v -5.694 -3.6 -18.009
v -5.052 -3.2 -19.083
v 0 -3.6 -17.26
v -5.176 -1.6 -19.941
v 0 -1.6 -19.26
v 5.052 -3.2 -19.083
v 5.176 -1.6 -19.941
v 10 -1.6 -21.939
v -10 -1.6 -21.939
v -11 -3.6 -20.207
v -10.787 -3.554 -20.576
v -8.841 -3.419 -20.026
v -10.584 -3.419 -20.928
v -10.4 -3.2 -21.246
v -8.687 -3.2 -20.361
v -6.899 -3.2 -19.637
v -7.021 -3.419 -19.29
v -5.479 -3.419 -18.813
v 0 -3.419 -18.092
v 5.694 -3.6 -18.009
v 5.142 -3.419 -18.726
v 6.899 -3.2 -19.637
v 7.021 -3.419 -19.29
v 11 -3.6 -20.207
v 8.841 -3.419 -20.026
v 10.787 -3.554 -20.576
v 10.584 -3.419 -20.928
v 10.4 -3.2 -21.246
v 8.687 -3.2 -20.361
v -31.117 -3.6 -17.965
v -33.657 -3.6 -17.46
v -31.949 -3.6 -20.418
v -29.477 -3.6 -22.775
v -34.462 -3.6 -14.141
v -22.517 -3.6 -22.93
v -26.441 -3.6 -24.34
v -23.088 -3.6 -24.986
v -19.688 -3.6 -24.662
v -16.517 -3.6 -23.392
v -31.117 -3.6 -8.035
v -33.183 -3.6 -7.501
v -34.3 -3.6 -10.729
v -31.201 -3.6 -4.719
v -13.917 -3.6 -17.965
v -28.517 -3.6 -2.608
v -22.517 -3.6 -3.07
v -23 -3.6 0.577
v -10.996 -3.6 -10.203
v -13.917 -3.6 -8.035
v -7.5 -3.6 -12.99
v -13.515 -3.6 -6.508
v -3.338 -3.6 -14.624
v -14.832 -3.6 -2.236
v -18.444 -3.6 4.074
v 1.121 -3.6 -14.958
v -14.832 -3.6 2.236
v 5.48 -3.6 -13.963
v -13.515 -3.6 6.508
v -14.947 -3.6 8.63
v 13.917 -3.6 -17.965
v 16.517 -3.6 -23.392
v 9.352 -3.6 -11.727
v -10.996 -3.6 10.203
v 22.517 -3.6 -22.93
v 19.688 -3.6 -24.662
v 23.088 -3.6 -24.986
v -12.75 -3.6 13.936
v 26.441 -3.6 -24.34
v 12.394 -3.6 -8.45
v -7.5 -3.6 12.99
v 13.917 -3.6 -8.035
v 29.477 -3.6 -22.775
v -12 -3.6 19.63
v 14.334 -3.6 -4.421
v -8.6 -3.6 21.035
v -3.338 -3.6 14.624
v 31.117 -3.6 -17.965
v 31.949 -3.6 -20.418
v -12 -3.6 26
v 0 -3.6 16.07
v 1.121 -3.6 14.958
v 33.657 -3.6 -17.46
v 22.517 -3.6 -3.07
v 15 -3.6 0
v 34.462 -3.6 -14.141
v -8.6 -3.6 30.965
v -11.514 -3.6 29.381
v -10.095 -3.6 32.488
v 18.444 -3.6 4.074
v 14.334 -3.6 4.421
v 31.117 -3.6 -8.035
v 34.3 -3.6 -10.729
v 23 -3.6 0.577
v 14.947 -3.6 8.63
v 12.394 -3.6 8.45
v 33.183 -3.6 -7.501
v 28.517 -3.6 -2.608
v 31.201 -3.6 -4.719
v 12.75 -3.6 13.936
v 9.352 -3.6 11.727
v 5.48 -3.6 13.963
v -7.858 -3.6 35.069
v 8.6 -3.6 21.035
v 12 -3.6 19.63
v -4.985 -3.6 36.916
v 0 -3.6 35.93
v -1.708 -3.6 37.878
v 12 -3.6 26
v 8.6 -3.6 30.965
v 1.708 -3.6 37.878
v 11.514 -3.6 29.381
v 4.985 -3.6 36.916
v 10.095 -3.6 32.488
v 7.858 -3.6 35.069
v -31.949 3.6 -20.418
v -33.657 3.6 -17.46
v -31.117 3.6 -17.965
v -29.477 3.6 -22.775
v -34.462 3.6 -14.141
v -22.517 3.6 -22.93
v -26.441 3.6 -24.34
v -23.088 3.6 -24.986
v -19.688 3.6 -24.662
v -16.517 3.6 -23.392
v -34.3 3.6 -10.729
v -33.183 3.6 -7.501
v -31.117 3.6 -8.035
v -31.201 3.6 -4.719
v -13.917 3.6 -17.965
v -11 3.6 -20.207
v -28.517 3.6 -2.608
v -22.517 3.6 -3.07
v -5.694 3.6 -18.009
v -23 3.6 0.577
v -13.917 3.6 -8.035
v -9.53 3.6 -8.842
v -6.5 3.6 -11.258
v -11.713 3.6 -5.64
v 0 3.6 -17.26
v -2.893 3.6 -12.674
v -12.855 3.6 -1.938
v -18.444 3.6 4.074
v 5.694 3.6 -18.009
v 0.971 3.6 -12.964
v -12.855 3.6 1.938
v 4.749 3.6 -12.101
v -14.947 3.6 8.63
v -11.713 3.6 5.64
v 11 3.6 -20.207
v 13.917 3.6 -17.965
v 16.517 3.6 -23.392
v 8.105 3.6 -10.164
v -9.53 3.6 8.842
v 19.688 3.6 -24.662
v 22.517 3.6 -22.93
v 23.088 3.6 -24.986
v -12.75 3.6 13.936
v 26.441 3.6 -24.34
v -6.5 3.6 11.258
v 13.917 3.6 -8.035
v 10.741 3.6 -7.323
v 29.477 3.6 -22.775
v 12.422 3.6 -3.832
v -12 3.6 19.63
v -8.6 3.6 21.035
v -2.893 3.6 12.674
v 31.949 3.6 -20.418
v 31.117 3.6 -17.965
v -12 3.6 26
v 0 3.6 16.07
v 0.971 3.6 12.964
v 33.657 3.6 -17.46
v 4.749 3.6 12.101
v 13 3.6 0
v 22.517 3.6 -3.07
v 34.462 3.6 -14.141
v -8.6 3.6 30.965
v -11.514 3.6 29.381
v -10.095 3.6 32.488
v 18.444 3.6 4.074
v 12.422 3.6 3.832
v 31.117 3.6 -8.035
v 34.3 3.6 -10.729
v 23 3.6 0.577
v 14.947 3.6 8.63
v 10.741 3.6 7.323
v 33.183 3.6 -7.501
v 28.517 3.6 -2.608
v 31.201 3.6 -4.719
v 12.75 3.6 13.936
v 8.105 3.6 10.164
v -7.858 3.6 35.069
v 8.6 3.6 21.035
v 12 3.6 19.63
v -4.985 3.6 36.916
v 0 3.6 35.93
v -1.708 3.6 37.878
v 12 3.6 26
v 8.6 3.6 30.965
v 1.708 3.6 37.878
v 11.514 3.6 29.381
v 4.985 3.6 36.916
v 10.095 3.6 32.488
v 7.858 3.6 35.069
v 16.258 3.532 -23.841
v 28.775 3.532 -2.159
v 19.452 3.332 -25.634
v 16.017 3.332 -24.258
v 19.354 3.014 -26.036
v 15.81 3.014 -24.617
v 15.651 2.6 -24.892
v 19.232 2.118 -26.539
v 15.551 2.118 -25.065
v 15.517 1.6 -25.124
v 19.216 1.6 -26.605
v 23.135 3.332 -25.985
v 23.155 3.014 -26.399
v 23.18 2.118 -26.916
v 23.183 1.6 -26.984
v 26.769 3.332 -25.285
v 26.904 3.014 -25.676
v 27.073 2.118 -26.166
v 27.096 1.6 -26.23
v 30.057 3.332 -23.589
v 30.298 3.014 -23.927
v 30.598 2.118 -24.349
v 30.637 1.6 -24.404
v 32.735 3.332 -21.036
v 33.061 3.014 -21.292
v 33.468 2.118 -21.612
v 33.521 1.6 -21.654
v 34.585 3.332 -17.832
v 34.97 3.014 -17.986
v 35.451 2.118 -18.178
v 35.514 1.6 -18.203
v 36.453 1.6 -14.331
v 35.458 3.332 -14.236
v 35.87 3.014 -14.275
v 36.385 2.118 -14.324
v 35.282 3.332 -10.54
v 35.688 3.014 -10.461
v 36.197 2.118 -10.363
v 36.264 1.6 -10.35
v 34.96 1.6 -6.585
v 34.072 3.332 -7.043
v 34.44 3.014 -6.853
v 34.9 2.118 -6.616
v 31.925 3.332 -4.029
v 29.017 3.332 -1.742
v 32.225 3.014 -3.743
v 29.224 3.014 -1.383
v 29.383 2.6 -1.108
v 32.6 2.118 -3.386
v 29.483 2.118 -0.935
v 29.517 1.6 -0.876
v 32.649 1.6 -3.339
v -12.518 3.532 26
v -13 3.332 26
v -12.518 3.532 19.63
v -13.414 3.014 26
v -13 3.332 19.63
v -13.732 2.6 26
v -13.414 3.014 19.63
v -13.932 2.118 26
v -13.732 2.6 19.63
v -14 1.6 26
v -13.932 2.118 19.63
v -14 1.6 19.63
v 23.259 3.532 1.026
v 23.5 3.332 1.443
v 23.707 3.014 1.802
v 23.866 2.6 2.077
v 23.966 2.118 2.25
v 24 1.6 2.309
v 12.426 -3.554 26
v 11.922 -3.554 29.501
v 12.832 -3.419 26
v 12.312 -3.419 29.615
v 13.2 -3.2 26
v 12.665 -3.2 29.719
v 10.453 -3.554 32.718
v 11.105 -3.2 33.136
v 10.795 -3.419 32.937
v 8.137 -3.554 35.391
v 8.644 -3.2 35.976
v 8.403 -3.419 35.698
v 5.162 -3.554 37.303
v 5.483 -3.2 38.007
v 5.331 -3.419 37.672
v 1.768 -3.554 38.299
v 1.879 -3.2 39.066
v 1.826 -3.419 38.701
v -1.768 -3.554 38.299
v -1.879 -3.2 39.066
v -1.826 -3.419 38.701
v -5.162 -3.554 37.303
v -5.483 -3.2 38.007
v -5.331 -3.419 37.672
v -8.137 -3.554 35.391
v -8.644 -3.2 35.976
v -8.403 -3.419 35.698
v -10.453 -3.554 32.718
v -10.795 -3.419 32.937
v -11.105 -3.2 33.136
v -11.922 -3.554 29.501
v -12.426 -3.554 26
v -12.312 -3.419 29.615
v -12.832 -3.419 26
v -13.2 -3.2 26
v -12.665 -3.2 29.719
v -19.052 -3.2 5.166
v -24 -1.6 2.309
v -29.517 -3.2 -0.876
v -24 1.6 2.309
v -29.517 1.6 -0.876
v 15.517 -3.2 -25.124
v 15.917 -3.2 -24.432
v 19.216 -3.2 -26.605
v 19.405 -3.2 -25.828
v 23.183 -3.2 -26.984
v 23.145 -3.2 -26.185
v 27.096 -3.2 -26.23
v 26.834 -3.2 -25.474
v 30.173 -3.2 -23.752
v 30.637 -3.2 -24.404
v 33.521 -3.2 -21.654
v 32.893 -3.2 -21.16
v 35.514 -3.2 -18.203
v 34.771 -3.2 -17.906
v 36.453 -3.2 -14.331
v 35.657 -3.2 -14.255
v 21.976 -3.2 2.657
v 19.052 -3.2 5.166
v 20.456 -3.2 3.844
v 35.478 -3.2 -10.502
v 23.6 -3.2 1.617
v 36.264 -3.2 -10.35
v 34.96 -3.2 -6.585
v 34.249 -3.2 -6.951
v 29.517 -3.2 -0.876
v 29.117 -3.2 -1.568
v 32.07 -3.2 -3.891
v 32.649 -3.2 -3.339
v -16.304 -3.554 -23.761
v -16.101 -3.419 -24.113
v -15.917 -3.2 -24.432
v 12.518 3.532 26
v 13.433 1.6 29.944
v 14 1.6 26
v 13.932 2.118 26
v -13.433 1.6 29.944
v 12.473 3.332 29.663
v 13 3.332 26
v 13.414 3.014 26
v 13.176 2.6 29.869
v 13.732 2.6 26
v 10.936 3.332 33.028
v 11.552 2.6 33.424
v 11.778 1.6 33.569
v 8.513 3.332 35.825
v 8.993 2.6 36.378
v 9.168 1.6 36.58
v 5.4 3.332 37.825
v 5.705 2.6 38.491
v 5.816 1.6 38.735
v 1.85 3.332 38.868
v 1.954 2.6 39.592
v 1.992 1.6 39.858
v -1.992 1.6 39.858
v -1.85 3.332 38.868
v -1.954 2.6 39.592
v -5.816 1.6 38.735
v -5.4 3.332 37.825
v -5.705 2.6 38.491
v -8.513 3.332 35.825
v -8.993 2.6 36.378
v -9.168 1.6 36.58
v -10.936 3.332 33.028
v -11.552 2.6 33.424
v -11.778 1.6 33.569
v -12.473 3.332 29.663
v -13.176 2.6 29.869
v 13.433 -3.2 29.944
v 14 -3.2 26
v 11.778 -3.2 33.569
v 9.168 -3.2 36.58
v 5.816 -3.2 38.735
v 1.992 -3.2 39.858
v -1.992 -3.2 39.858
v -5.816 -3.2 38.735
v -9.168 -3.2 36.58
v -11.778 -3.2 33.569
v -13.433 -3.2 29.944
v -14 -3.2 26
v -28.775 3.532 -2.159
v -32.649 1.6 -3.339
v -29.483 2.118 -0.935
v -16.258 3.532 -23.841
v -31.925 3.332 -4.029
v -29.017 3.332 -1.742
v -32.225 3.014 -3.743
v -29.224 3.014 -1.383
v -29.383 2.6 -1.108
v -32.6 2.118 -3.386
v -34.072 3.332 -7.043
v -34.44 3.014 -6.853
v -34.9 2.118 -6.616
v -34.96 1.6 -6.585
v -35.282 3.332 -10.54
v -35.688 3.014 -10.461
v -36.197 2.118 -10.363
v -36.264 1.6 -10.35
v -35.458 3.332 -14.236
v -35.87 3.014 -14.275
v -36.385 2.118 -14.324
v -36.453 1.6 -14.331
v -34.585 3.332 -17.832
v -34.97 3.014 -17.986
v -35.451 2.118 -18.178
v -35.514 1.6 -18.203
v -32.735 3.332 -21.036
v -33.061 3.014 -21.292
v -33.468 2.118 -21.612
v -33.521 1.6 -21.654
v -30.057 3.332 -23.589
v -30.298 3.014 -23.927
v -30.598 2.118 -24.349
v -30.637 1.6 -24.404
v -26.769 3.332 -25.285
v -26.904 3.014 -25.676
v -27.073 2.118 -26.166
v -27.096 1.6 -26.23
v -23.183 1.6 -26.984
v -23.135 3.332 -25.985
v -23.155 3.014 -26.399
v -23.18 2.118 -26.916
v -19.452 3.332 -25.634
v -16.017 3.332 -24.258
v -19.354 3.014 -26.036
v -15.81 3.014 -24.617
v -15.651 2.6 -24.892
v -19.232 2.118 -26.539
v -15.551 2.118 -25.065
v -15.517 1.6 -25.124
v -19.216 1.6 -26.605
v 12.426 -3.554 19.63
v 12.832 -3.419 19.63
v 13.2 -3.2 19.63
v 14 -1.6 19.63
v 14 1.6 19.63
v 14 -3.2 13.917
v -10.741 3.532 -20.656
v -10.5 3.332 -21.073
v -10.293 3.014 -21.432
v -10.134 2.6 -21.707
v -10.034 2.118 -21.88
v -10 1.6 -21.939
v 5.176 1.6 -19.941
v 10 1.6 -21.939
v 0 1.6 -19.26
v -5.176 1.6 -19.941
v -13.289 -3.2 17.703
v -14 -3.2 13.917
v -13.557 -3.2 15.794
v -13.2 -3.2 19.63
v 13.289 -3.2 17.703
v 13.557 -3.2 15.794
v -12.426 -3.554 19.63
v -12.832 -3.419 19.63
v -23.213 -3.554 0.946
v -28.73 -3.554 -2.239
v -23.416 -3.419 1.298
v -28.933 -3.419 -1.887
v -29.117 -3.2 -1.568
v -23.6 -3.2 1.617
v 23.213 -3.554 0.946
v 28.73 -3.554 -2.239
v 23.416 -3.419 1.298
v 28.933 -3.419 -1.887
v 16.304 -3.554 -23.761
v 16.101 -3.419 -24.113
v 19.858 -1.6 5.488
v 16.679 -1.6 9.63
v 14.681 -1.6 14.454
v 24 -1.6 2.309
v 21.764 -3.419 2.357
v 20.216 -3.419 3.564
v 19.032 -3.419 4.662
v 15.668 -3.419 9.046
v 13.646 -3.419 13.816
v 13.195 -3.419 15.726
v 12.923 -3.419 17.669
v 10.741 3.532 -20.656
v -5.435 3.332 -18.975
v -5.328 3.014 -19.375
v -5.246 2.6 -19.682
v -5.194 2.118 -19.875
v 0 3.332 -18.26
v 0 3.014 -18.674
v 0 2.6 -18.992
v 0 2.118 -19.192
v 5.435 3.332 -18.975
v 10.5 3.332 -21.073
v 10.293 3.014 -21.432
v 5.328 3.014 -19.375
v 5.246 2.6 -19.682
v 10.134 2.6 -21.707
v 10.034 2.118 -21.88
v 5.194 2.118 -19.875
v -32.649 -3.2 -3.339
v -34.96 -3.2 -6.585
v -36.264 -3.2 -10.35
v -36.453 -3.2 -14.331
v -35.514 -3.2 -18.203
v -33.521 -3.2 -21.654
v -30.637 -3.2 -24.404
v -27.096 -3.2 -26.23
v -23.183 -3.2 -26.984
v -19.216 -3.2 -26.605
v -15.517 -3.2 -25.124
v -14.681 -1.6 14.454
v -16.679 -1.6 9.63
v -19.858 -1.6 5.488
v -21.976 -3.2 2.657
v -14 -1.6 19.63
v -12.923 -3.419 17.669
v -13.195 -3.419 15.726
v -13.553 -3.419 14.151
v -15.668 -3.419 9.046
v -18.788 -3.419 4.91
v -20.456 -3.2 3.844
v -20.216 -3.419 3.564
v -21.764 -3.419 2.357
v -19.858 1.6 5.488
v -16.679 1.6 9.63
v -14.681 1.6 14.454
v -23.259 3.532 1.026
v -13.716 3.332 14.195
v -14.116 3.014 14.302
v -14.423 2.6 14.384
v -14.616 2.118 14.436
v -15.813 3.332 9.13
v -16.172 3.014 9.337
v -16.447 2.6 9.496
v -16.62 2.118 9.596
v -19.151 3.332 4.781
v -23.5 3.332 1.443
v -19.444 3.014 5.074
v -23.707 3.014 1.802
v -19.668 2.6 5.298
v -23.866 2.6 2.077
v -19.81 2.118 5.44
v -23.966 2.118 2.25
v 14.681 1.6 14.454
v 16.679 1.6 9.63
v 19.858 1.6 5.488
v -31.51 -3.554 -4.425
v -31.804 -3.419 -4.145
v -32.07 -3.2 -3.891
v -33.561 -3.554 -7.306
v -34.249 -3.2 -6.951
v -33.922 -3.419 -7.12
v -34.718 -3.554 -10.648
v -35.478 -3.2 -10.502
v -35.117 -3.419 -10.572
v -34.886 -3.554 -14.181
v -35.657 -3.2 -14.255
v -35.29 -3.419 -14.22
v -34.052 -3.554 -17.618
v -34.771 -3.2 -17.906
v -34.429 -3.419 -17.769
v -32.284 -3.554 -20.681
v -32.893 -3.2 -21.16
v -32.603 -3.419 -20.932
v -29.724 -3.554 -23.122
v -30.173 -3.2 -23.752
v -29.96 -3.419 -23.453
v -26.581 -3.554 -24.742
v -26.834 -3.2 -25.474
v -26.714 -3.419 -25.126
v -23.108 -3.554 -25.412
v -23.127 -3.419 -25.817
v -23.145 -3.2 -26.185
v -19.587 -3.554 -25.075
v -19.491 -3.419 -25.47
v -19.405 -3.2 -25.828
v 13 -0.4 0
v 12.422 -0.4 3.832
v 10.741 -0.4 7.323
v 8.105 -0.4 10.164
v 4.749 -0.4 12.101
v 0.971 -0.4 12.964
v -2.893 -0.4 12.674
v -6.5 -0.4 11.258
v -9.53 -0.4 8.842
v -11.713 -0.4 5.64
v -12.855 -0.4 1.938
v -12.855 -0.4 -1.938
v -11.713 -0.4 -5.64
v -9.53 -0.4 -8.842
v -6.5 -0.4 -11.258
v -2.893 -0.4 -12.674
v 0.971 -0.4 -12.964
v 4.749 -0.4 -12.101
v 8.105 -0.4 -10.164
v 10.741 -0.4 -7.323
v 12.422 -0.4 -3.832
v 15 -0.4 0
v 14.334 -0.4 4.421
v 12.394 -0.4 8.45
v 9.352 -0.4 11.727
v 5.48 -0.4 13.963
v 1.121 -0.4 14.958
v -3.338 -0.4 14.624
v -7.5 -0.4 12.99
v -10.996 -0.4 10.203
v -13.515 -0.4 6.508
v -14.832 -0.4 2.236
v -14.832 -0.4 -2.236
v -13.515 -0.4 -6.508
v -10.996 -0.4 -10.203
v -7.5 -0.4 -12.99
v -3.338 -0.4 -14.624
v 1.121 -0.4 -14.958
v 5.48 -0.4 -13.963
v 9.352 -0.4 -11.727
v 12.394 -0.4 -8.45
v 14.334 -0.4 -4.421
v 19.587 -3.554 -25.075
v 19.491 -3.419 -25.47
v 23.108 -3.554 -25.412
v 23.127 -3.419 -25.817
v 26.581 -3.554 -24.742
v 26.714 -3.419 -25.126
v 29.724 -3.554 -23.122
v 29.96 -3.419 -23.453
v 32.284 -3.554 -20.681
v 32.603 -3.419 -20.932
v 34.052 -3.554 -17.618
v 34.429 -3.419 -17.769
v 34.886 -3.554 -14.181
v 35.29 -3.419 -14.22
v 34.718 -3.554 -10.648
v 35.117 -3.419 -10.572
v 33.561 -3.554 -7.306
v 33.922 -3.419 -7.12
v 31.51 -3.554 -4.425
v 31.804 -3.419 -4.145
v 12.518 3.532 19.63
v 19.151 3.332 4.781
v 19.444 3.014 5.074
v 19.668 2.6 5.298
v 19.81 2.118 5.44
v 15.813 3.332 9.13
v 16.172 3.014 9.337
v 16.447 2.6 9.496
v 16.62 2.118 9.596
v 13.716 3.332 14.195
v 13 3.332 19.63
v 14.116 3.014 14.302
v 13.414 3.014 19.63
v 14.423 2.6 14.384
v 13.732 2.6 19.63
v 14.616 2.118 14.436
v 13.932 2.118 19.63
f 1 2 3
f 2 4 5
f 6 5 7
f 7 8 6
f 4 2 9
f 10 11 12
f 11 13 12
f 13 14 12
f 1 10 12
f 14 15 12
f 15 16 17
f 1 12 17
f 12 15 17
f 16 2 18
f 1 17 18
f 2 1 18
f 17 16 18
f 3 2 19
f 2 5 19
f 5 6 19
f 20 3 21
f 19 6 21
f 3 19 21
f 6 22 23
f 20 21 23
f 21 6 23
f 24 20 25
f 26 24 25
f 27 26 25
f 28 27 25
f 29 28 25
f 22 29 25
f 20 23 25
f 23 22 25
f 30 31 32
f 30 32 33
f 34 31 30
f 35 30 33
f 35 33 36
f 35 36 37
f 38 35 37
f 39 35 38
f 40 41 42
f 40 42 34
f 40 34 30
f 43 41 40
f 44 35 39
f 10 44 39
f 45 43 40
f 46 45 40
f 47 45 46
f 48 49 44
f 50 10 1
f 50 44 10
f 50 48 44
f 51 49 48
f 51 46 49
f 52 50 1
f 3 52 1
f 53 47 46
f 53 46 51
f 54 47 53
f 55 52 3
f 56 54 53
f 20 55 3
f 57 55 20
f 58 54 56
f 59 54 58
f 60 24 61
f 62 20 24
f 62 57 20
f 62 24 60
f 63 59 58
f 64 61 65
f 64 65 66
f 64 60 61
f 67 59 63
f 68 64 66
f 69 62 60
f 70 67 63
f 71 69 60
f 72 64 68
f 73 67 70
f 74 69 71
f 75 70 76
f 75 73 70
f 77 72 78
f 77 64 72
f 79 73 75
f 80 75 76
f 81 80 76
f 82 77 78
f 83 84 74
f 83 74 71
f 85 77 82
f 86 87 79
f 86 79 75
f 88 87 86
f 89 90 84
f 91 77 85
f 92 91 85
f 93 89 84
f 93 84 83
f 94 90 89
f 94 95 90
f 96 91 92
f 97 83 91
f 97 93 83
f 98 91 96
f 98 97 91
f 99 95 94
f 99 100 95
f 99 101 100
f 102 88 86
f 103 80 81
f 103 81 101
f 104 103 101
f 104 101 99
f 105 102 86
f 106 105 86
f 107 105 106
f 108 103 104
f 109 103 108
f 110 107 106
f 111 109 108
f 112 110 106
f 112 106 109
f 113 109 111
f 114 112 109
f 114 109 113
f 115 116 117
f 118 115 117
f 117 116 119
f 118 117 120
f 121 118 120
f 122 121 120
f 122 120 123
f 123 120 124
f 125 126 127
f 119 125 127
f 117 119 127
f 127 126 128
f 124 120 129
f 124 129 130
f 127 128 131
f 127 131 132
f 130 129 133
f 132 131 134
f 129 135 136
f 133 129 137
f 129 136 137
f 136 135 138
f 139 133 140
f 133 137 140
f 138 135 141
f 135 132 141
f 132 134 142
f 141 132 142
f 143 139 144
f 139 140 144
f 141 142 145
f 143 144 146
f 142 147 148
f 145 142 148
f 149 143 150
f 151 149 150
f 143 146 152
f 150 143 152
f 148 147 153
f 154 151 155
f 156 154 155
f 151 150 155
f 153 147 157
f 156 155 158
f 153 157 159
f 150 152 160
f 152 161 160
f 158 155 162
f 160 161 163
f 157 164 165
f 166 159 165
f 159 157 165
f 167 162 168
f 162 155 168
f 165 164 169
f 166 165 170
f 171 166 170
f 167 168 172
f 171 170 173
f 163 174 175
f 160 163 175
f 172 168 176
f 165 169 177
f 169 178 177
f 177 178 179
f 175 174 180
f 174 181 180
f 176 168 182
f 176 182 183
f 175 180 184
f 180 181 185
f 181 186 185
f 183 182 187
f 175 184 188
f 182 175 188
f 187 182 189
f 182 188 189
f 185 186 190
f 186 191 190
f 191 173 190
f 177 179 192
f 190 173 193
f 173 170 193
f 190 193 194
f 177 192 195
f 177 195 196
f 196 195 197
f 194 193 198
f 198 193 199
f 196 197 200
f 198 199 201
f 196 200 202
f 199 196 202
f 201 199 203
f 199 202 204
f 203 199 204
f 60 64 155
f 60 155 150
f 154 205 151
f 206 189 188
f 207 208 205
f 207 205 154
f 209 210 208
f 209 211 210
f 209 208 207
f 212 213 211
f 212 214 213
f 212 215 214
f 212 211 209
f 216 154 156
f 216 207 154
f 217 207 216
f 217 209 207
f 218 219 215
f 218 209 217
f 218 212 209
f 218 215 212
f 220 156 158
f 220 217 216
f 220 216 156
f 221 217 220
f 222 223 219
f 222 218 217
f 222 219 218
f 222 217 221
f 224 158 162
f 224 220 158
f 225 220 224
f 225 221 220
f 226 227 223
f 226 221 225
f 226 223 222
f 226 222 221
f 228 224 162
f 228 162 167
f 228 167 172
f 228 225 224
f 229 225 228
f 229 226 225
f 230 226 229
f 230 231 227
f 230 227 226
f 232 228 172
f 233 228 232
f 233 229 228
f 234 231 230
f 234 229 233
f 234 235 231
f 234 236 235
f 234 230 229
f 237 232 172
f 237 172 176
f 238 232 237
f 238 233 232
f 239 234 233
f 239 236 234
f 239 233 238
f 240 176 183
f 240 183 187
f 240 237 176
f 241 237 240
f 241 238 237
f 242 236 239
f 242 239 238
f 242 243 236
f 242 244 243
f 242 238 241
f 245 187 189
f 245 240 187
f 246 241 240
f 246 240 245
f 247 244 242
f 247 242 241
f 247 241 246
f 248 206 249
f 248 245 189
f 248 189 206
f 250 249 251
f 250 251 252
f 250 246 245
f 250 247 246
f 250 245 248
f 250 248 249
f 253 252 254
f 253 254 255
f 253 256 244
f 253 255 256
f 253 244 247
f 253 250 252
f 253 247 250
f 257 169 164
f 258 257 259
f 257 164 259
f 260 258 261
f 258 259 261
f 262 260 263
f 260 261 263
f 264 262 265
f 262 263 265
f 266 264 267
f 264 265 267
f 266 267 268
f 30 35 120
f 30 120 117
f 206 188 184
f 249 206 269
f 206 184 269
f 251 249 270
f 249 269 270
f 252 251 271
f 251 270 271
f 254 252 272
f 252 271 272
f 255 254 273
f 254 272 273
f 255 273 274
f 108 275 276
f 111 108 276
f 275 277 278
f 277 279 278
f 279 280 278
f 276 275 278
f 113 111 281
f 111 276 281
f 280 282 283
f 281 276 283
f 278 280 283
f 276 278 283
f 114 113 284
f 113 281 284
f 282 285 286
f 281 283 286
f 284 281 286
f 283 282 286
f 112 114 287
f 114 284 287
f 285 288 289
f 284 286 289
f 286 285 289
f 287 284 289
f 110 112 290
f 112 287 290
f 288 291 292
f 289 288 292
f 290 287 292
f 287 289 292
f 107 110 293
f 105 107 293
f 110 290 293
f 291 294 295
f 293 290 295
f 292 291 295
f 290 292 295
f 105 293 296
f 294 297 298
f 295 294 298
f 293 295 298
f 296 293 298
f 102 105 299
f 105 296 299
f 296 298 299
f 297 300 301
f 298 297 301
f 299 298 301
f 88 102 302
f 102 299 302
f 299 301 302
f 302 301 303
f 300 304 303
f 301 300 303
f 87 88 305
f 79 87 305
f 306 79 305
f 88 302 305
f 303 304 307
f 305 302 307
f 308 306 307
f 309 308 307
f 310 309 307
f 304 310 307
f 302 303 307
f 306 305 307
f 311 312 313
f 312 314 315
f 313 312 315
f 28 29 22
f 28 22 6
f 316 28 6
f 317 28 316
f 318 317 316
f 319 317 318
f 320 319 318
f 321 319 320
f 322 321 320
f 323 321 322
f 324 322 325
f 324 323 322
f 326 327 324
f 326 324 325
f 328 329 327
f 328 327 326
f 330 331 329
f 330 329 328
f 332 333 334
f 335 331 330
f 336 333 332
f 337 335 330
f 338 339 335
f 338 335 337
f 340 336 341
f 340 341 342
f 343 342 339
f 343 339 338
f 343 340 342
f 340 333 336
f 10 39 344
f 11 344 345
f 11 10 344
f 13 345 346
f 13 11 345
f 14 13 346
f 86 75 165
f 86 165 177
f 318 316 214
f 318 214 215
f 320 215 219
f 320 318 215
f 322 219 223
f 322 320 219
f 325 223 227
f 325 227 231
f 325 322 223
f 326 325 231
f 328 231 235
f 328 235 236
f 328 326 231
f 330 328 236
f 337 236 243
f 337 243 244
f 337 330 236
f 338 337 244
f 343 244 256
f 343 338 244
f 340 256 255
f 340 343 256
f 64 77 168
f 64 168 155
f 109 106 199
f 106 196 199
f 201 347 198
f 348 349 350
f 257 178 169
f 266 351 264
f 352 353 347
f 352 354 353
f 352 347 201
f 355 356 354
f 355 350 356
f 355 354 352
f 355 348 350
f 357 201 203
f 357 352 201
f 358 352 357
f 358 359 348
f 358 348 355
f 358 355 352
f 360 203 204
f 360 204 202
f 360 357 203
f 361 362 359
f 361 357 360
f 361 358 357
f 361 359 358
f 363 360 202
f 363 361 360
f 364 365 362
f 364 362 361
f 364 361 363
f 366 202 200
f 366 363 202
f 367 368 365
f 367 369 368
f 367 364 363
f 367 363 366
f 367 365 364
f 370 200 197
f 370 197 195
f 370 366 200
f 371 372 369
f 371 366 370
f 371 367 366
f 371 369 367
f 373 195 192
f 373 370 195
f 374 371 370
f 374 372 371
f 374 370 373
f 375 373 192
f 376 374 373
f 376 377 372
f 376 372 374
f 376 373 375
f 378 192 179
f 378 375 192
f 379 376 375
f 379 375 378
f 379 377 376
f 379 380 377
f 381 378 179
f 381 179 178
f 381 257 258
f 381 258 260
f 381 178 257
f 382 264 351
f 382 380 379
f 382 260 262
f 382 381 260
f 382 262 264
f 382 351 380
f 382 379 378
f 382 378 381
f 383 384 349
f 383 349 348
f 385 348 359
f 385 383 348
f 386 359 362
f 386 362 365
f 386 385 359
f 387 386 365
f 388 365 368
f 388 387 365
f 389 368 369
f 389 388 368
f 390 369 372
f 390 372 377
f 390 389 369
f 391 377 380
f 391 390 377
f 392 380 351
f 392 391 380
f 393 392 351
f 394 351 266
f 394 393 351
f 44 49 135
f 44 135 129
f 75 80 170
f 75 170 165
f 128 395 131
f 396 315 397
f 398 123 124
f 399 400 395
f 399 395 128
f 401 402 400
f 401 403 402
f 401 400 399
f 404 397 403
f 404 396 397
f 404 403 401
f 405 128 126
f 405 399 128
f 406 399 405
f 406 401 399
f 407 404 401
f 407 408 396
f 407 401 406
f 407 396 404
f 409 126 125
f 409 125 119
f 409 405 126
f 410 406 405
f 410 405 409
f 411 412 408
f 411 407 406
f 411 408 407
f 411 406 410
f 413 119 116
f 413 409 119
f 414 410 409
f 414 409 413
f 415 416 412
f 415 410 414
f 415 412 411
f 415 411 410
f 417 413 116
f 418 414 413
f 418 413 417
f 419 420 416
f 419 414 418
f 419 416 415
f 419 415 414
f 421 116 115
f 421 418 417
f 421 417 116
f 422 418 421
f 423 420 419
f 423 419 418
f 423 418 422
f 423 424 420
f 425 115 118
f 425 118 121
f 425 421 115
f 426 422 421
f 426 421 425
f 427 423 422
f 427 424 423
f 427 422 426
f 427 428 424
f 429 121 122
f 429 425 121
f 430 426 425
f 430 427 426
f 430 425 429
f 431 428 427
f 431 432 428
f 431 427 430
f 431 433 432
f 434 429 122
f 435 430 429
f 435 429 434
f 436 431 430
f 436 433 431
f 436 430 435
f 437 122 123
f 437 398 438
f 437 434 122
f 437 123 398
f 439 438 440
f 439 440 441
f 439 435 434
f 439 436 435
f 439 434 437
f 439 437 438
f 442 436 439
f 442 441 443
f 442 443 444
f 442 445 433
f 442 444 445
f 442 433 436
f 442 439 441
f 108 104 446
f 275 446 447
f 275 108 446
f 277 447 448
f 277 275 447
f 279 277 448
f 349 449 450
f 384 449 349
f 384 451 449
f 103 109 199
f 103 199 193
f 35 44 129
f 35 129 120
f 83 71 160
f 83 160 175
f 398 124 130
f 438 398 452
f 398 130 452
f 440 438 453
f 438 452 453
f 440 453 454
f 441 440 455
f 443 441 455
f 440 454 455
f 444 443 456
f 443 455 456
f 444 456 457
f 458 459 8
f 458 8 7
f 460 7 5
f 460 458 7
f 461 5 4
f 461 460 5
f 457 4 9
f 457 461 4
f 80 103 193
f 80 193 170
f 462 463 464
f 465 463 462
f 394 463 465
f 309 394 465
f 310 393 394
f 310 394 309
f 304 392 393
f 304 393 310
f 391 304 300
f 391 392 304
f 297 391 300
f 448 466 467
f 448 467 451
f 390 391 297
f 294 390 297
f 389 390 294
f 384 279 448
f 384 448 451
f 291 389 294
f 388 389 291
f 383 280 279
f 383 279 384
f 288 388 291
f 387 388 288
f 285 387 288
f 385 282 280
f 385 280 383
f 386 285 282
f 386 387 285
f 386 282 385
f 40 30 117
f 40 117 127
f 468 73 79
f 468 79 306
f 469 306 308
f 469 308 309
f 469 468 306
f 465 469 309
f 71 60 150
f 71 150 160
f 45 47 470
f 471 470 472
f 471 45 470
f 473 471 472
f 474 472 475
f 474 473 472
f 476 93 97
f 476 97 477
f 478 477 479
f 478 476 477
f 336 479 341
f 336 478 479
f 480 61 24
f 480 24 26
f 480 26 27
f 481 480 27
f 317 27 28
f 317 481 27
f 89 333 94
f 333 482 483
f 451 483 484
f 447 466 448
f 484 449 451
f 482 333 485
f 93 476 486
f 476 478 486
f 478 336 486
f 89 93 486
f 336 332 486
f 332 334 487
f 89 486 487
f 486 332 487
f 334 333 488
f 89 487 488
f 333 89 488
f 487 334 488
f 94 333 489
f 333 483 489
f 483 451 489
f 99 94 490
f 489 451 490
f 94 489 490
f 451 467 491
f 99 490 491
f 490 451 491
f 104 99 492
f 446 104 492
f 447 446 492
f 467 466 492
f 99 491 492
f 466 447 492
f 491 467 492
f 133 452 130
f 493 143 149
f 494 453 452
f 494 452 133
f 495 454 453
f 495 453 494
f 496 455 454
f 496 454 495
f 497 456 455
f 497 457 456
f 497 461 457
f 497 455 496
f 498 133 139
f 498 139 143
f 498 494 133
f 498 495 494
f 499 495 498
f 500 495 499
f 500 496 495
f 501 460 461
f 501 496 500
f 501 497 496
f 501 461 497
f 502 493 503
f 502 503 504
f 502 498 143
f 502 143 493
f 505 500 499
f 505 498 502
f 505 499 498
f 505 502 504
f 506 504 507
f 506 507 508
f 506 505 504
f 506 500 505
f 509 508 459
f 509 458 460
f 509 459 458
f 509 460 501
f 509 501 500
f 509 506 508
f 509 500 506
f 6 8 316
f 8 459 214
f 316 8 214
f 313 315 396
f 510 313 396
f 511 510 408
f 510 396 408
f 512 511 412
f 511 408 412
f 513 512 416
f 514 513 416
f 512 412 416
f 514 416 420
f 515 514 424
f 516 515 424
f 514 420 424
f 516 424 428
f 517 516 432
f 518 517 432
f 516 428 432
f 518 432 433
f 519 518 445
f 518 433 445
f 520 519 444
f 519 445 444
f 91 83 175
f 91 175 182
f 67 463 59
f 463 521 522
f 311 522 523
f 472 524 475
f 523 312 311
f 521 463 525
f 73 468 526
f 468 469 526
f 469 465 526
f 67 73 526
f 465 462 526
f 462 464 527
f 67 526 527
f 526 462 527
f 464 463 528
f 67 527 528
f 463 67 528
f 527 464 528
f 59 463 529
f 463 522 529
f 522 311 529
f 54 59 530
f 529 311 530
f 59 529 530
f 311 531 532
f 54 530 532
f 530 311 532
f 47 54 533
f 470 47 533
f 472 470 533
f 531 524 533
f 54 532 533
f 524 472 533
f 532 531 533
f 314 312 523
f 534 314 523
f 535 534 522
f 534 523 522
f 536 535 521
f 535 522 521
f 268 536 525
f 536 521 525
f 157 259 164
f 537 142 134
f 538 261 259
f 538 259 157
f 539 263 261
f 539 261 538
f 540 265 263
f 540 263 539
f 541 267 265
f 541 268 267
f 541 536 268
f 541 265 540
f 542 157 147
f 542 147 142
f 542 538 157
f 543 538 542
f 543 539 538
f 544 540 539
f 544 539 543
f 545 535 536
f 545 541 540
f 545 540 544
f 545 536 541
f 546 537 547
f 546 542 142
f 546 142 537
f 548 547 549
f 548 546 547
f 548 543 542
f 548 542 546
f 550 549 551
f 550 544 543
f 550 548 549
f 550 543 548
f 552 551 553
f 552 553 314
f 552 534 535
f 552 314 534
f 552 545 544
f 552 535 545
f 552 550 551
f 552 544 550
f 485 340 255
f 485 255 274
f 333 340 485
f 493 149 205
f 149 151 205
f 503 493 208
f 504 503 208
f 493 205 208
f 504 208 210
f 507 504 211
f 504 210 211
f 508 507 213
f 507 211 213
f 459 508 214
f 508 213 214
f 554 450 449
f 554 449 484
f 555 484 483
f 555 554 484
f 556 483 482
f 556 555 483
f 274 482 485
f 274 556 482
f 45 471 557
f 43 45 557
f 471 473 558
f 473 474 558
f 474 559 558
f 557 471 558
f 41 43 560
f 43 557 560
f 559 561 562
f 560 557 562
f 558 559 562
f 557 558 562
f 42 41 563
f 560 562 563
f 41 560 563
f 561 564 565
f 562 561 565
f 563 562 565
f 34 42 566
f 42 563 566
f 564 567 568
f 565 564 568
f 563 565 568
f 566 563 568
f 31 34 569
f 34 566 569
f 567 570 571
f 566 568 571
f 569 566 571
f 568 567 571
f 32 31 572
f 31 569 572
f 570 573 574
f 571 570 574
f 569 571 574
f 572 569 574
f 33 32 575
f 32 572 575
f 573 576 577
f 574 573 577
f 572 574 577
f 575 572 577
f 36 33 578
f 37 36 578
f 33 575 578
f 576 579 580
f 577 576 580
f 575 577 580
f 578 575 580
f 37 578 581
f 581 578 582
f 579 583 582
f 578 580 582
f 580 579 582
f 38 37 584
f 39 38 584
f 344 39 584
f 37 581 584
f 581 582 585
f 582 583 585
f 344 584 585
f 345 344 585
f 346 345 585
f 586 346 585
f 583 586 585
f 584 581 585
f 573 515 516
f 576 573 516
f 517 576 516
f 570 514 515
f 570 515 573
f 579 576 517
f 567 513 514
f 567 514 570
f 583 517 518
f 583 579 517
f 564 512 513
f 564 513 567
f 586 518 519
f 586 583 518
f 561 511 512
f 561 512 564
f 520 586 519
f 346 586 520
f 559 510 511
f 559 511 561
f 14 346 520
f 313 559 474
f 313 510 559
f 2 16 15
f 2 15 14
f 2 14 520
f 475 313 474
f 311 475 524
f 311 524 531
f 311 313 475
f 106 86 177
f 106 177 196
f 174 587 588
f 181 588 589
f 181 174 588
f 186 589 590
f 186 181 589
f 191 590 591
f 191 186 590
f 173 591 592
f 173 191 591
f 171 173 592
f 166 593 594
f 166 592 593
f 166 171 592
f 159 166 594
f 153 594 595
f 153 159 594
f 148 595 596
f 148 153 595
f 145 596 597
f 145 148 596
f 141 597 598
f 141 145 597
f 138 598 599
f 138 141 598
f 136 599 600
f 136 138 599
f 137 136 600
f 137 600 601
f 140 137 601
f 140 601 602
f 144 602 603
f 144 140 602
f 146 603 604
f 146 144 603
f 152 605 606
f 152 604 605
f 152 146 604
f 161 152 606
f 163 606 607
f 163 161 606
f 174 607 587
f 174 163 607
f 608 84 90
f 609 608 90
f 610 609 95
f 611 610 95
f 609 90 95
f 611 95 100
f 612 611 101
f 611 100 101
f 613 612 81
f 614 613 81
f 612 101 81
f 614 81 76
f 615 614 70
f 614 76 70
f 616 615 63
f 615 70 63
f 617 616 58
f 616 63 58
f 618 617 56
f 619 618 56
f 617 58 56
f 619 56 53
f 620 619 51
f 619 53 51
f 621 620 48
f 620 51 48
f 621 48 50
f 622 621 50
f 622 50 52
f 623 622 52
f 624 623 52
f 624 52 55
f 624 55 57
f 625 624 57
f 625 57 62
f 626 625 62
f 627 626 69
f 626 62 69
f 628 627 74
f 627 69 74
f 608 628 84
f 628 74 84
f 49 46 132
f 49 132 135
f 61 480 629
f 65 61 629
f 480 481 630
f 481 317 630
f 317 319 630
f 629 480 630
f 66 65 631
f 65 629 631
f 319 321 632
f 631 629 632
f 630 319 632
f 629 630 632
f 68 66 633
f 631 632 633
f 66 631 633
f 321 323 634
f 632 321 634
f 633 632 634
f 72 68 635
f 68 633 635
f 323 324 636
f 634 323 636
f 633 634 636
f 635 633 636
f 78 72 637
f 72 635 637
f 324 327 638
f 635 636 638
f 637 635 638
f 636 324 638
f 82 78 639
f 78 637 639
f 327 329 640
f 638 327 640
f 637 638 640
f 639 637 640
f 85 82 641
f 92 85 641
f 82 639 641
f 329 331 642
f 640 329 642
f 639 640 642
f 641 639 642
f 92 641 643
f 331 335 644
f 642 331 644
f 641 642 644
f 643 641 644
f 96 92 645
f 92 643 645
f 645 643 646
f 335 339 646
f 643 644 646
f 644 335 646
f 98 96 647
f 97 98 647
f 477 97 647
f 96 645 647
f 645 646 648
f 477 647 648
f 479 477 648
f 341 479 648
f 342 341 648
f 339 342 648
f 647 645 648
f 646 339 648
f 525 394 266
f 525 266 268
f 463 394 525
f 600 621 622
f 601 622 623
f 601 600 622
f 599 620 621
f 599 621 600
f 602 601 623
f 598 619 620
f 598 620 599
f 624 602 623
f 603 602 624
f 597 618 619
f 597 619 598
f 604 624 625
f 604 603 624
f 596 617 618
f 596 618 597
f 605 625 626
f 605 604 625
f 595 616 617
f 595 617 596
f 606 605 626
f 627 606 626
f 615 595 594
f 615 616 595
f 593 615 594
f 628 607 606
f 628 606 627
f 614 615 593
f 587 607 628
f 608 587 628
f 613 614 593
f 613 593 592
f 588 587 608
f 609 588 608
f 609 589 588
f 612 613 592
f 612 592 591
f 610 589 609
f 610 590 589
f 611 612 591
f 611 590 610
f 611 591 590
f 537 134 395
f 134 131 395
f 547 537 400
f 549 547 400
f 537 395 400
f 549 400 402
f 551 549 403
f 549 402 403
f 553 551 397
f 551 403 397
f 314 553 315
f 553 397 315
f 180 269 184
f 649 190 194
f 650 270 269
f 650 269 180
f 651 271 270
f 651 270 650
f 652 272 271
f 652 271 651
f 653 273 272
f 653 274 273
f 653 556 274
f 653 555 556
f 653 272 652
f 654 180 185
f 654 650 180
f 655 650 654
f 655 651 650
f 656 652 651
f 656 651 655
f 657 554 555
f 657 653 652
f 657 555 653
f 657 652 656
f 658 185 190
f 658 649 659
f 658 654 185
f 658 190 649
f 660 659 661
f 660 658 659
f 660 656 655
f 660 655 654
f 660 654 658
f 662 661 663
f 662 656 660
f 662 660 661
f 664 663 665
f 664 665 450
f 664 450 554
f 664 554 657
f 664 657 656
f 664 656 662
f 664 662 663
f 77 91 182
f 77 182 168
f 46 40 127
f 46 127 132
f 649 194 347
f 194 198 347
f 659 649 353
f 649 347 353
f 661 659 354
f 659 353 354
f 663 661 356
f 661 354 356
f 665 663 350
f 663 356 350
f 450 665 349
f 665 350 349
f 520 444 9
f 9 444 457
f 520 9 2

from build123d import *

# Parameters (mm, degrees)
F0_R     = 13
F1_DEPTH = 3.6
F2_R     = 20
F3_R     = 2
F4_R     = 2
F5_DEPTH = 3.2
F6_R     = 15
F7_DEPTH = 3.2


# Not quite as in the source:
# - a feature names something its author has since deleted; it is built from what else it names


with BuildPart() as f1:
    # F0 (on Front) → F1 (new body, symmetric)
    with BuildSketch(Plane.XZ):
        with BuildLine():
            Line((14, 8.0829037687), (14, 26))
            ThreePointArc((14, 26), (0, 40), (-14, 26))
            Line((-14, 26), (-14, 8.0829037687))
            Line((-14, 8.0829037687), (-29.5166604984, -0.875644347))
            ThreePointArc((-29.5166604984, -0.875644347), (-34.6410161514, -20), (-15.5166604984, -25.124355653))
            Line((-15.5166604984, -25.124355653), (0, -16.1658075373))
            Line((0, -16.1658075373), (15.5166604984, -25.124355653))
            ThreePointArc((15.5166604984, -25.124355653), (34.6410161514, -20), (29.5166604984, -0.875644347))
            Line((29.5166604984, -0.875644347), (14, 8.0829037687))
        make_face()
        Polygon((-22.5166604984, -22.9304246301), (-31.1166604984, -17.965212315), (-31.1166604984, -8.034787685), (-22.5166604984, -3.0695753699), (-13.9166604984, -8.034787685), (-13.9166604984, -17.965212315), align=None, mode=Mode.SUBTRACT)
        Polygon((31.1166604984, -8.034787685), (31.1166604984, -17.965212315), (22.5166604984, -22.9304246301), (13.9166604984, -17.965212315), (13.9166604984, -8.034787685), (22.5166604984, -3.0695753699), align=None, mode=Mode.SUBTRACT)
        Circle(F0_R, mode=Mode.SUBTRACT)
        Polygon((0, 35.9304246301), (8.6, 30.965212315), (8.6, 21.034787685), (0, 16.0695753699), (-8.6, 21.034787685), (-8.6, 30.965212315), align=None, mode=Mode.SUBTRACT)
    extrude(amount=F1_DEPTH, both=True)

    # F2
    f2_edges = [f1.edges().sort_by_distance(p)[0] for p in [
        (0, 0, -16.165808),
        (14, 0, 8.082904),
        (-14, 0, 8.082904),
    ]]
    fillet(f2_edges, radius=F2_R)

    # F3
    f3_edges = [f1.edges().sort_by_distance(p)[0] for p in [
        (-14, -3.6, 22.814955),
    ]]
    fillet(f3_edges, radius=F3_R)

    # F4
    f4_edges = [f1.edges().sort_by_distance(p)[0] for p in [
        (0, 3.6, 40),
        (26.75833, 3.6, 0.716878),
        (16.679492, 3.6, 9.629909),
        (34.641016, 3.6, -20),
        (14, 3.6, 22.814955),
        (12.75833, 3.6, -23.531833),
        (0, 3.6, -19.259818),
        (-14, 3.6, 22.814955),
        (-12.75833, 3.6, -23.531833),
        (-16.679492, 3.6, 9.629909),
        (-34.641016, 3.6, -20),
        (-26.75833, 3.6, 0.716878),
    ]]
    fillet(f4_edges, radius=F4_R)

    # F0 (on Front) → F5 (join)
    with BuildSketch(Plane.XZ):
        with BuildLine():
            Line((14, 8.0829037687), (14, 26))
            ThreePointArc((14, 26), (0, 40), (-14, 26))
            Line((-14, 26), (-14, 8.0829037687))
            Line((-14, 8.0829037687), (-29.5166604984, -0.875644347))
            ThreePointArc((-29.5166604984, -0.875644347), (-34.6410161514, -20), (-15.5166604984, -25.124355653))
            Line((-15.5166604984, -25.124355653), (0, -16.1658075373))
            Line((0, -16.1658075373), (15.5166604984, -25.124355653))
            ThreePointArc((15.5166604984, -25.124355653), (34.6410161514, -20), (29.5166604984, -0.875644347))
            Line((29.5166604984, -0.875644347), (14, 8.0829037687))
        make_face()
        Polygon((-22.5166604984, -22.9304246301), (-31.1166604984, -17.965212315), (-31.1166604984, -8.034787685), (-22.5166604984, -3.0695753699), (-13.9166604984, -8.034787685), (-13.9166604984, -17.965212315), align=None, mode=Mode.SUBTRACT)
        Polygon((31.1166604984, -8.034787685), (31.1166604984, -17.965212315), (22.5166604984, -22.9304246301), (13.9166604984, -17.965212315), (13.9166604984, -8.034787685), (22.5166604984, -3.0695753699), align=None, mode=Mode.SUBTRACT)
        Circle(F0_R, mode=Mode.SUBTRACT)
        Polygon((0, 35.9304246301), (8.6, 30.965212315), (8.6, 21.034787685), (0, 16.0695753699), (-8.6, 21.034787685), (-8.6, 30.965212315), align=None, mode=Mode.SUBTRACT)
    extrude(amount=F5_DEPTH)

    # F6 (on face) → F7 (cut)
    with BuildSketch(Plane.XZ.offset(3.6)):
        Circle(F6_R)
    extrude(amount=-F7_DEPTH, mode=Mode.SUBTRACT)


solid = f1.part
